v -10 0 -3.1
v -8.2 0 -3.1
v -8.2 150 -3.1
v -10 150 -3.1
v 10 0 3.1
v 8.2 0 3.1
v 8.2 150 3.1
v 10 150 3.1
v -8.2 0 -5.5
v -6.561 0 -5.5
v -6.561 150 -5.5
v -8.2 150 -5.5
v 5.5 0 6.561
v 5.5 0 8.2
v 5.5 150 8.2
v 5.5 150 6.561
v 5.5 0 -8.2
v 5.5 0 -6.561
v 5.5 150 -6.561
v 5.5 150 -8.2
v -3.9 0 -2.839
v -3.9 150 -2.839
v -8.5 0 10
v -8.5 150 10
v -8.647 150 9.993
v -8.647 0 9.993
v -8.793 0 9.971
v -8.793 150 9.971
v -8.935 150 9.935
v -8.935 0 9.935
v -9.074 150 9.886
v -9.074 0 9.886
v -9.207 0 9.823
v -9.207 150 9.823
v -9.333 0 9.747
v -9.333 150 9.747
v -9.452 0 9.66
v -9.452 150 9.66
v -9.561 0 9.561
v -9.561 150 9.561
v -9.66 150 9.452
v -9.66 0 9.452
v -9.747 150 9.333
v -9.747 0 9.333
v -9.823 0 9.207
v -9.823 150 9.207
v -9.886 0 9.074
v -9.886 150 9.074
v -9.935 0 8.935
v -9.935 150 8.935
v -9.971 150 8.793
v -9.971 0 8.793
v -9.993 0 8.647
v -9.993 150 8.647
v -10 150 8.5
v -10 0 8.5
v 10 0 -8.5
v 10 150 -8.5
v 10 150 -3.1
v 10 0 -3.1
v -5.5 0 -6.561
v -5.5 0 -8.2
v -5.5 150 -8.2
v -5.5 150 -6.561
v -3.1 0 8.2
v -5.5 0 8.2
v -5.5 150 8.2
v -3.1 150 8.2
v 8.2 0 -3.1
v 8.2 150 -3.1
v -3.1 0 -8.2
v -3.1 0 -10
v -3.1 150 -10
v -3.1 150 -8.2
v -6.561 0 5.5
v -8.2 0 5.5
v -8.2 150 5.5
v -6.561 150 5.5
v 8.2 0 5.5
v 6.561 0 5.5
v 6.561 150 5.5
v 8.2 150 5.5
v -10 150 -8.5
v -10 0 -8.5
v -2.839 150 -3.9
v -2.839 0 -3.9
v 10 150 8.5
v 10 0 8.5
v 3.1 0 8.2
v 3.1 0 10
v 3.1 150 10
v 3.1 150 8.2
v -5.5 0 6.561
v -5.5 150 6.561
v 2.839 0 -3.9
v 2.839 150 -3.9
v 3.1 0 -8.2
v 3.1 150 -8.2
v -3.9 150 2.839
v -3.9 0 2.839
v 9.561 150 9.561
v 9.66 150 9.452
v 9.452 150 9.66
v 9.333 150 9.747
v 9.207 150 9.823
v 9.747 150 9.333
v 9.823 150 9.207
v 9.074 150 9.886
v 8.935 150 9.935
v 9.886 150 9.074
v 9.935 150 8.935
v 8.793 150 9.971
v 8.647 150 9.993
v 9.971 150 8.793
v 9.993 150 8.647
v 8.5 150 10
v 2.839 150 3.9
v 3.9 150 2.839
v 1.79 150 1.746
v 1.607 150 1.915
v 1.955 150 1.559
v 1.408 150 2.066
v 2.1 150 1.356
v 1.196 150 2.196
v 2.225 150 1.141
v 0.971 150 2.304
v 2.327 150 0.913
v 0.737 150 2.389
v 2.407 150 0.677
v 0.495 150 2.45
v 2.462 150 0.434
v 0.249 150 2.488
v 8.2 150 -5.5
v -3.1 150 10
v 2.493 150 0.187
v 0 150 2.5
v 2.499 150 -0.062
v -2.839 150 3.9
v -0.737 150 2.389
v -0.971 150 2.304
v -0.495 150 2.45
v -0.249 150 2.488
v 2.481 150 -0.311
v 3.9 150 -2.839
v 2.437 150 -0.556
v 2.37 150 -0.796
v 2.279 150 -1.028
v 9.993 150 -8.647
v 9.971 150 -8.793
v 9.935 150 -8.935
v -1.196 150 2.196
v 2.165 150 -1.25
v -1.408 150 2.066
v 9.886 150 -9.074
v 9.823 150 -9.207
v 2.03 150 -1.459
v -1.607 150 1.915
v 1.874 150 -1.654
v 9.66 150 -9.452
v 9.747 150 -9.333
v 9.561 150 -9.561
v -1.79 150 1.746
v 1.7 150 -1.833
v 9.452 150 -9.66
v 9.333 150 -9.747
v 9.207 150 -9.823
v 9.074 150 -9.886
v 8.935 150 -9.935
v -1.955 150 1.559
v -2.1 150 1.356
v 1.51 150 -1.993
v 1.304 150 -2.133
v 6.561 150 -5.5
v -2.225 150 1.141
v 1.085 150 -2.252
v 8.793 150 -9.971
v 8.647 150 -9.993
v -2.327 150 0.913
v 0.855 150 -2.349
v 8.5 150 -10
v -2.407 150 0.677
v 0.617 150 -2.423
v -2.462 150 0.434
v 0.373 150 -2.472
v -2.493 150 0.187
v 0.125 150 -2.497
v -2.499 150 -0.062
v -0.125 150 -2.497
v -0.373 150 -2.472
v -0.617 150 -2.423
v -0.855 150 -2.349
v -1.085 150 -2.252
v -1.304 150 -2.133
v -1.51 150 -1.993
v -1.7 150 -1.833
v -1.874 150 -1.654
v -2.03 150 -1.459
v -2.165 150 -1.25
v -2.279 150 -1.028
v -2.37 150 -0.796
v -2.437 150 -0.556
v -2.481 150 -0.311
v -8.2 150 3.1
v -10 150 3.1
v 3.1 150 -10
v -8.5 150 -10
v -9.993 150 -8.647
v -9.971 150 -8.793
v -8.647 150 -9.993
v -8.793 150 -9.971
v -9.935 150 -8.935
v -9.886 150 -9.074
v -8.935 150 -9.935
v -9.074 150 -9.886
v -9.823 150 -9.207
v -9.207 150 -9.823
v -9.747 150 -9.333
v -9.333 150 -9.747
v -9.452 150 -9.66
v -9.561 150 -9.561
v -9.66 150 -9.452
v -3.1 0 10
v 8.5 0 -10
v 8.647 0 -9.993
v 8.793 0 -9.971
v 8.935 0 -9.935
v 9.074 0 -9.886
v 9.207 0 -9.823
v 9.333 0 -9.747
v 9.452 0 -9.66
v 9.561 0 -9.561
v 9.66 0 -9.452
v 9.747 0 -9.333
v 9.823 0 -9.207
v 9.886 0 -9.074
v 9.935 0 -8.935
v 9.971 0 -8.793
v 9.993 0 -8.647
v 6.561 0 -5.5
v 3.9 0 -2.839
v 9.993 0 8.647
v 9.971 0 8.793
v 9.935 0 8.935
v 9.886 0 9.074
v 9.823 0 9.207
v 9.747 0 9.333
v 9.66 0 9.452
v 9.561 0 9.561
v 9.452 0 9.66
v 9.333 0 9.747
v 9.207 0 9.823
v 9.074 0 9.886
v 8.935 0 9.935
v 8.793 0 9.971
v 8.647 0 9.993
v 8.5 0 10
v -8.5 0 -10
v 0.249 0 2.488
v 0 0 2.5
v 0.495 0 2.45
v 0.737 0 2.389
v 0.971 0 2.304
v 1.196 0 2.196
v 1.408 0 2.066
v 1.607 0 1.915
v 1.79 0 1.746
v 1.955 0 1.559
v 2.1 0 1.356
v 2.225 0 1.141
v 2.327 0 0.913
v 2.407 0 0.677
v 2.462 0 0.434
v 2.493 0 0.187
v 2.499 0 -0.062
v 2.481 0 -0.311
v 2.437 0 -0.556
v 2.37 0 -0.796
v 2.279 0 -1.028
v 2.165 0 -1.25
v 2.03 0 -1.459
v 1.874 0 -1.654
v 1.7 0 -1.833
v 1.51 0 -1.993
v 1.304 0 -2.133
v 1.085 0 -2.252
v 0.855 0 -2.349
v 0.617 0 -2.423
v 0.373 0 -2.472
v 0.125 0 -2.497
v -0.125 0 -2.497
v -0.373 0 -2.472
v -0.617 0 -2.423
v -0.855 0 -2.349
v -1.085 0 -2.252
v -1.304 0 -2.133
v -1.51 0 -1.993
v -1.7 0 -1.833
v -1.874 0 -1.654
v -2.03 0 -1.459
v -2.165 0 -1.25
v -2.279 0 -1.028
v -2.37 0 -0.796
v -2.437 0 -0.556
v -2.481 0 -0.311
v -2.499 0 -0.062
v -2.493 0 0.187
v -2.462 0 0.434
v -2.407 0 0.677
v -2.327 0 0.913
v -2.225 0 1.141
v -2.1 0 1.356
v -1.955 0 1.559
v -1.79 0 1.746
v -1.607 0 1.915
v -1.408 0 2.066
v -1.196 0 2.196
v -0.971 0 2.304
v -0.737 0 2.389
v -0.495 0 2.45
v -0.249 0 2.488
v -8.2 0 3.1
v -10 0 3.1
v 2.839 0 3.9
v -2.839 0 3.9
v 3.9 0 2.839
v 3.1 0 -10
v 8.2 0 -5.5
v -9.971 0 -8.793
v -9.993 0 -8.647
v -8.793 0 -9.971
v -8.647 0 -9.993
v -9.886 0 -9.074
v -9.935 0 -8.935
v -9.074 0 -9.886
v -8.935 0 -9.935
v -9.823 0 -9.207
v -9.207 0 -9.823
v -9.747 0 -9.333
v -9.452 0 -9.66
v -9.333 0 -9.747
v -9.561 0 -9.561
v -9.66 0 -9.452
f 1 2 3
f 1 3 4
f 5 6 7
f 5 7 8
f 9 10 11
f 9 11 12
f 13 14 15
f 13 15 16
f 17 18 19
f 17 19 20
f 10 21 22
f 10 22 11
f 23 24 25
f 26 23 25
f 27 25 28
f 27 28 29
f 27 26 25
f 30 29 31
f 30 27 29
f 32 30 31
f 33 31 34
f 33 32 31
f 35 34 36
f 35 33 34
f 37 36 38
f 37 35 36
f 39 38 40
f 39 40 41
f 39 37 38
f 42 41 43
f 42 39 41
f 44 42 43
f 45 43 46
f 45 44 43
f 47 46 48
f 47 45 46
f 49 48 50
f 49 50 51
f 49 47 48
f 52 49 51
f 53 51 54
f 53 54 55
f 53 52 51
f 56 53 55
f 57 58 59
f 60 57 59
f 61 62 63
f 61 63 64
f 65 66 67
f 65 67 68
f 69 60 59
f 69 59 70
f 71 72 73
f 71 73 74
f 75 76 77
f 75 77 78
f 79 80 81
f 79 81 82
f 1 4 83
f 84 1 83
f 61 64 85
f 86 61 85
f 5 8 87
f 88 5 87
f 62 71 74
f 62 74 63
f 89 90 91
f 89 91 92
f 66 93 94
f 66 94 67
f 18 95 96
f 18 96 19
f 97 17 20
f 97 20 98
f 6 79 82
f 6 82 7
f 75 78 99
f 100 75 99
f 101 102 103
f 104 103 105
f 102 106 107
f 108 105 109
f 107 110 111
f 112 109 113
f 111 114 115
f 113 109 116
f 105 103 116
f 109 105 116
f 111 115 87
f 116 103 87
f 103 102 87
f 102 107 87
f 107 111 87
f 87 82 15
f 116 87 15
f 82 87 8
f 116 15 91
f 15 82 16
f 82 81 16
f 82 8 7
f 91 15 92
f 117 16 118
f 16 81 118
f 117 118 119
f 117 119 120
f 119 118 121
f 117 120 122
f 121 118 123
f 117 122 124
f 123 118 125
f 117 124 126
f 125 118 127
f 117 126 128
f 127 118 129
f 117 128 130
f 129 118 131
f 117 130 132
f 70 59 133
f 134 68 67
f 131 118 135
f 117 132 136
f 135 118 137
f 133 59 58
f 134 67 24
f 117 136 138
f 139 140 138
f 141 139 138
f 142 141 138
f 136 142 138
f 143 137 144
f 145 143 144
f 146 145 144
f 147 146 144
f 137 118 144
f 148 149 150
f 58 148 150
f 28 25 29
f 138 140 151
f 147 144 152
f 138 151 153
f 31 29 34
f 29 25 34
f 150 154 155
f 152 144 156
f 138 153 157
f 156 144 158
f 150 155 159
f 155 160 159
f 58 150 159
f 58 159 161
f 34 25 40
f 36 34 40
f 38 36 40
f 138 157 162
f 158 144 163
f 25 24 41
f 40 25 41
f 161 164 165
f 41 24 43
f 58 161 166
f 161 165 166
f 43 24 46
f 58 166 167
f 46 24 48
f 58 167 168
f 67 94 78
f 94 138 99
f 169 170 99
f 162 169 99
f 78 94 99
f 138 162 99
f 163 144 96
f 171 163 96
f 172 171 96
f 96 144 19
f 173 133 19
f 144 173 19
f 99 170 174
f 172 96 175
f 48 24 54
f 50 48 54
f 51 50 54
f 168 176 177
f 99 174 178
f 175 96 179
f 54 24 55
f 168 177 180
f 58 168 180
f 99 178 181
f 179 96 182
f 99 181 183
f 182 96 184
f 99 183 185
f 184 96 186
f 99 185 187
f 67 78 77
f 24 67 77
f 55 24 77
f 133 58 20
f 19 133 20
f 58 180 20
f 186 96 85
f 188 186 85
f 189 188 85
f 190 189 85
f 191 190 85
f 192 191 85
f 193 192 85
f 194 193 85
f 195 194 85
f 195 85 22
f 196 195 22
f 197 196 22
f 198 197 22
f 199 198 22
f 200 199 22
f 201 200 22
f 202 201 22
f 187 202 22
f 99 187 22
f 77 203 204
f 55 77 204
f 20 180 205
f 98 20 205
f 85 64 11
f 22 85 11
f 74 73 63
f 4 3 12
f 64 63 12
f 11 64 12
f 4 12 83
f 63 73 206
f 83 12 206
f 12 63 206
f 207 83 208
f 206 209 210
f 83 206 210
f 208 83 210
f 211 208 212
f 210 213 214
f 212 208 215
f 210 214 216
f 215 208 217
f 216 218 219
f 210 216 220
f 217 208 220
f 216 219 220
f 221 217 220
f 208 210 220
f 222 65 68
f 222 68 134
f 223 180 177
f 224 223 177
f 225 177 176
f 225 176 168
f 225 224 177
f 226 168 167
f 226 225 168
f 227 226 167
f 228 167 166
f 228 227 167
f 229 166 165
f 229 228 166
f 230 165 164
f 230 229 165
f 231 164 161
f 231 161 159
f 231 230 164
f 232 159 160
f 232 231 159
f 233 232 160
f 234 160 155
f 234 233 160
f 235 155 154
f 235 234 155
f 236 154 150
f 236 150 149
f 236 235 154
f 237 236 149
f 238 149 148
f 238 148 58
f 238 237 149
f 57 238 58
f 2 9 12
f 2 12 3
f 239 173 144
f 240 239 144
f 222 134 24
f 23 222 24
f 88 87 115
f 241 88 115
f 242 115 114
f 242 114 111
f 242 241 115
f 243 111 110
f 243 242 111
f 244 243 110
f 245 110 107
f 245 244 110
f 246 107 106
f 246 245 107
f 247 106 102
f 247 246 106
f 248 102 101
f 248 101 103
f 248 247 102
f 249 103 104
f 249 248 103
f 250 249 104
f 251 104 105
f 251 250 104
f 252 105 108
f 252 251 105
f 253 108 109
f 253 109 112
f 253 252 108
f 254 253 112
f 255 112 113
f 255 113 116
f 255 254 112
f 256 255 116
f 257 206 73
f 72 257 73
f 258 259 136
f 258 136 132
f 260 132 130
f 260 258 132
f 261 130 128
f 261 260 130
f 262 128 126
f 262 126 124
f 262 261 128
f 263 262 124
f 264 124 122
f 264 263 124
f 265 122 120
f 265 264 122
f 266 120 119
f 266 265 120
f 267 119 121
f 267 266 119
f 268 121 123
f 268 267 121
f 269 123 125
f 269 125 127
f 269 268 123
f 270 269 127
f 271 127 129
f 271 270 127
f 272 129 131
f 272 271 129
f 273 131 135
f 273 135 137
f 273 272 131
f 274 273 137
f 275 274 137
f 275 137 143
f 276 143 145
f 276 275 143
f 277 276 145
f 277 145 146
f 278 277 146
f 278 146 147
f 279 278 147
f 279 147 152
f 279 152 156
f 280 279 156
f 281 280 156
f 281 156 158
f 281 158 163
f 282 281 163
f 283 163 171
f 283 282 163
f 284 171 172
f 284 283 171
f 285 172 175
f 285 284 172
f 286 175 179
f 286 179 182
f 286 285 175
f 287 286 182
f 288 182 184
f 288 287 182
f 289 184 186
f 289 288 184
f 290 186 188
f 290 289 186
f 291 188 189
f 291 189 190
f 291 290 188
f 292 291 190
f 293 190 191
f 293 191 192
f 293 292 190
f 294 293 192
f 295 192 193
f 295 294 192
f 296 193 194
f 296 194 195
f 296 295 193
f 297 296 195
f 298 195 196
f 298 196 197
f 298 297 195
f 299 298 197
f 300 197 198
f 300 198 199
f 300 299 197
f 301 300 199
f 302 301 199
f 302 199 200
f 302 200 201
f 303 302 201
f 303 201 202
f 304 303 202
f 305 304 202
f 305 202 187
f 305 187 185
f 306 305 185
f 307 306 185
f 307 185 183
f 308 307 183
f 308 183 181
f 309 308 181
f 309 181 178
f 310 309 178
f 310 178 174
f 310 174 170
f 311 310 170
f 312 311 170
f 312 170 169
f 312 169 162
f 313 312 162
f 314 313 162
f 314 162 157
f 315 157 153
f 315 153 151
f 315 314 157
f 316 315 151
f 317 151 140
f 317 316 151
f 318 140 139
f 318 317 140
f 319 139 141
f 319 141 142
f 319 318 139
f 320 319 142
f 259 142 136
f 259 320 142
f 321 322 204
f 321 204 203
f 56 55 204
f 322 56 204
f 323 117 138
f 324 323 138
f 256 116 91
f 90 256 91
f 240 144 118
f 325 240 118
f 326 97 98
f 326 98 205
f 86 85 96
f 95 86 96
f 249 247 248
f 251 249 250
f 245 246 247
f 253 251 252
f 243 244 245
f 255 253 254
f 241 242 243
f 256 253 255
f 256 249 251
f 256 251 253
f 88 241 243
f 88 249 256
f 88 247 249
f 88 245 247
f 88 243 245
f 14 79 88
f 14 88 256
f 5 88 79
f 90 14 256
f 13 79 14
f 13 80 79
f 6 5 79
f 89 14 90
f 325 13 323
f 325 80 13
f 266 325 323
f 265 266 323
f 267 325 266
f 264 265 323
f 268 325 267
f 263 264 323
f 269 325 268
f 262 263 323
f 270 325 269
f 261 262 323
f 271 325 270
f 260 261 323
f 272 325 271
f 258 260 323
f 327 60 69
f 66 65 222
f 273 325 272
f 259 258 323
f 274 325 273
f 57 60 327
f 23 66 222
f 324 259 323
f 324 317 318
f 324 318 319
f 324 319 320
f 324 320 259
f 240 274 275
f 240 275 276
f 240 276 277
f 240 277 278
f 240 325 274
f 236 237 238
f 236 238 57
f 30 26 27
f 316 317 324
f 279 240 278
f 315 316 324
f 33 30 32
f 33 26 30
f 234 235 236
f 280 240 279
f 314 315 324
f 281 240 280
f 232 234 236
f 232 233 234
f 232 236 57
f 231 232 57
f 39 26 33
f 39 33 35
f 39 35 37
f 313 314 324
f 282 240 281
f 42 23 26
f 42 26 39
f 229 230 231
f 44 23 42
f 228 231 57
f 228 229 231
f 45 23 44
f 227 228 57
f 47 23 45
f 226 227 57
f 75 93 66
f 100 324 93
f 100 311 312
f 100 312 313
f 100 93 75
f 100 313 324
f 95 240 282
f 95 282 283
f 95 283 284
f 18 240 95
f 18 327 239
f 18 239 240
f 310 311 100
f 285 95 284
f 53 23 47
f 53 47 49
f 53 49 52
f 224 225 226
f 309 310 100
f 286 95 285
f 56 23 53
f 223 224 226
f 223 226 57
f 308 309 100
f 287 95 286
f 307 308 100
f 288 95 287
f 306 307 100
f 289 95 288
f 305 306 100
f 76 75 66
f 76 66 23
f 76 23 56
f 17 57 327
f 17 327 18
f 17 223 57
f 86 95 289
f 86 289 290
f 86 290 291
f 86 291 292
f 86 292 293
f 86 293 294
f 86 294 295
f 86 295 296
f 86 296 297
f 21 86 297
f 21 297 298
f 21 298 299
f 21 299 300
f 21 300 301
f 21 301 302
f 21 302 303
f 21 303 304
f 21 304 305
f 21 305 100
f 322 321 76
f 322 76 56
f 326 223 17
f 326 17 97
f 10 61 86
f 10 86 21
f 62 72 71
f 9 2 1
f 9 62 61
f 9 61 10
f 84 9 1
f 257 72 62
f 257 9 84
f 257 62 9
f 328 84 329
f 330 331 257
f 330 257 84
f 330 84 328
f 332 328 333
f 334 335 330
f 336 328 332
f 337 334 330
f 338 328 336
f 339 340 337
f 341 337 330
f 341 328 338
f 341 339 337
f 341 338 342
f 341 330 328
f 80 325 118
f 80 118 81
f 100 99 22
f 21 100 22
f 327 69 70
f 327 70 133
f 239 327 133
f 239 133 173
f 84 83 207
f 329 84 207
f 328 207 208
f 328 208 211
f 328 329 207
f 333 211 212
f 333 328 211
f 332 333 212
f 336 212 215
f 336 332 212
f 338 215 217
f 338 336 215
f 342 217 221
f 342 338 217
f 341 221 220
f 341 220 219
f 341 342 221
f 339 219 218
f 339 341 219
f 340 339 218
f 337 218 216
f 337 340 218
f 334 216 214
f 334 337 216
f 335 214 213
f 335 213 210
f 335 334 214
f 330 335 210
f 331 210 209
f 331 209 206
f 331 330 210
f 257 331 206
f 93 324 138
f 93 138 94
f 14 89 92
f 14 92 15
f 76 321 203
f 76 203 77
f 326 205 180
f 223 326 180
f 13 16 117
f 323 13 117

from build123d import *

# Parameters (mm, degrees)
SKETCH_2_R      = 2.5
EXTRUDE_1_DEPTH = 150


with BuildPart() as part:
    # 草图2 → 凸台-拉伸1 (new body)
    with BuildSketch(Plane(origin=(0, 0, 0), x_dir=(1, 0, 0), z_dir=(0, 1, 0))):
        with BuildLine():
            Line((-2.839339828, -3.9), (-5.5, -6.560660172))
            Line((-5.5, -6.560660172), (-5.5, -8.2))
            Line((-5.5, -8.2), (-3.1, -8.2))
            Line((-3.1, -8.2), (-3.1, -10))
            Line((-3.1, -10), (-8.5, -10))
            ThreePointArc((-8.5, -10), (-9.560660172, -9.560660172), (-10, -8.5))
            Line((-10, -8.5), (-10, -3.1))
            Line((-10, -3.1), (-8.2, -3.1))
            Line((-8.2, -3.1), (-8.2, -5.5))
            Line((-8.2, -5.5), (-6.560660172, -5.5))
            Line((-6.560660172, -5.5), (-3.9, -2.839339828))
            Line((-3.9, -2.839339828), (-3.9, 2.839339828))
            Line((-3.9, 2.839339828), (-6.560660172, 5.5))
            Line((-6.560660172, 5.5), (-8.2, 5.5))
            Line((-8.2, 5.5), (-8.2, 3.1))
            Line((-8.2, 3.1), (-10, 3.1))
            Line((-10, 3.1), (-10, 8.5))
            ThreePointArc((-10, 8.5), (-9.560660172, 9.560660172), (-8.5, 10))
            Line((-8.5, 10), (-3.1, 10))
            Line((-3.1, 10), (-3.1, 8.2))
            Line((-3.1, 8.2), (-5.5, 8.2))
            Line((-5.5, 8.2), (-5.5, 6.560660172))
            Line((-5.5, 6.560660172), (-2.839339828, 3.9))
            Line((-2.839339828, 3.9), (2.839339828, 3.9))
            Line((2.839339828, 3.9), (5.5, 6.560660172))
            Line((5.5, 6.560660172), (5.5, 8.2))
            Line((5.5, 8.2), (3.1, 8.2))
            Line((3.1, 8.2), (3.1, 10))
            Line((3.1, 10), (8.5, 10))
            ThreePointArc((8.5, 10), (9.560660172, 9.560660172), (10, 8.5))
            Line((10, 8.5), (10, 3.1))
            Line((10, 3.1), (8.2, 3.1))
            Line((8.2, 3.1), (8.2, 5.5))
            Line((8.2, 5.5), (6.560660172, 5.5))
            Line((6.560660172, 5.5), (3.9, 2.839339828))
            Line((3.9, 2.839339828), (3.9, -2.839339828))
            Line((3.9, -2.839339828), (6.560660172, -5.5))
            Line((6.560660172, -5.5), (8.2, -5.5))
            Line((8.2, -5.5), (8.2, -3.1))
            Line((8.2, -3.1), (10, -3.1))
            Line((10, -3.1), (10, -8.5))
            ThreePointArc((10, -8.5), (9.560660172, -9.560660172), (8.5, -10))
            Line((8.5, -10), (3.1, -10))
            Line((3.1, -10), (3.1, -8.2))
            Line((3.1, -8.2), (5.5, -8.2))
            Line((5.5, -8.2), (5.5, -6.560660172))
            Line((5.5, -6.560660172), (2.839339828, -3.9))
            Line((2.839339828, -3.9), (-2.839339828, -3.9))
        make_face()
        with Locations(Location((0, 0, 0), (0, 0, 270))):
            Circle(SKETCH_2_R, mode=Mode.SUBTRACT)
    extrude(amount=EXTRUDE_1_DEPTH)


solid = part.part
